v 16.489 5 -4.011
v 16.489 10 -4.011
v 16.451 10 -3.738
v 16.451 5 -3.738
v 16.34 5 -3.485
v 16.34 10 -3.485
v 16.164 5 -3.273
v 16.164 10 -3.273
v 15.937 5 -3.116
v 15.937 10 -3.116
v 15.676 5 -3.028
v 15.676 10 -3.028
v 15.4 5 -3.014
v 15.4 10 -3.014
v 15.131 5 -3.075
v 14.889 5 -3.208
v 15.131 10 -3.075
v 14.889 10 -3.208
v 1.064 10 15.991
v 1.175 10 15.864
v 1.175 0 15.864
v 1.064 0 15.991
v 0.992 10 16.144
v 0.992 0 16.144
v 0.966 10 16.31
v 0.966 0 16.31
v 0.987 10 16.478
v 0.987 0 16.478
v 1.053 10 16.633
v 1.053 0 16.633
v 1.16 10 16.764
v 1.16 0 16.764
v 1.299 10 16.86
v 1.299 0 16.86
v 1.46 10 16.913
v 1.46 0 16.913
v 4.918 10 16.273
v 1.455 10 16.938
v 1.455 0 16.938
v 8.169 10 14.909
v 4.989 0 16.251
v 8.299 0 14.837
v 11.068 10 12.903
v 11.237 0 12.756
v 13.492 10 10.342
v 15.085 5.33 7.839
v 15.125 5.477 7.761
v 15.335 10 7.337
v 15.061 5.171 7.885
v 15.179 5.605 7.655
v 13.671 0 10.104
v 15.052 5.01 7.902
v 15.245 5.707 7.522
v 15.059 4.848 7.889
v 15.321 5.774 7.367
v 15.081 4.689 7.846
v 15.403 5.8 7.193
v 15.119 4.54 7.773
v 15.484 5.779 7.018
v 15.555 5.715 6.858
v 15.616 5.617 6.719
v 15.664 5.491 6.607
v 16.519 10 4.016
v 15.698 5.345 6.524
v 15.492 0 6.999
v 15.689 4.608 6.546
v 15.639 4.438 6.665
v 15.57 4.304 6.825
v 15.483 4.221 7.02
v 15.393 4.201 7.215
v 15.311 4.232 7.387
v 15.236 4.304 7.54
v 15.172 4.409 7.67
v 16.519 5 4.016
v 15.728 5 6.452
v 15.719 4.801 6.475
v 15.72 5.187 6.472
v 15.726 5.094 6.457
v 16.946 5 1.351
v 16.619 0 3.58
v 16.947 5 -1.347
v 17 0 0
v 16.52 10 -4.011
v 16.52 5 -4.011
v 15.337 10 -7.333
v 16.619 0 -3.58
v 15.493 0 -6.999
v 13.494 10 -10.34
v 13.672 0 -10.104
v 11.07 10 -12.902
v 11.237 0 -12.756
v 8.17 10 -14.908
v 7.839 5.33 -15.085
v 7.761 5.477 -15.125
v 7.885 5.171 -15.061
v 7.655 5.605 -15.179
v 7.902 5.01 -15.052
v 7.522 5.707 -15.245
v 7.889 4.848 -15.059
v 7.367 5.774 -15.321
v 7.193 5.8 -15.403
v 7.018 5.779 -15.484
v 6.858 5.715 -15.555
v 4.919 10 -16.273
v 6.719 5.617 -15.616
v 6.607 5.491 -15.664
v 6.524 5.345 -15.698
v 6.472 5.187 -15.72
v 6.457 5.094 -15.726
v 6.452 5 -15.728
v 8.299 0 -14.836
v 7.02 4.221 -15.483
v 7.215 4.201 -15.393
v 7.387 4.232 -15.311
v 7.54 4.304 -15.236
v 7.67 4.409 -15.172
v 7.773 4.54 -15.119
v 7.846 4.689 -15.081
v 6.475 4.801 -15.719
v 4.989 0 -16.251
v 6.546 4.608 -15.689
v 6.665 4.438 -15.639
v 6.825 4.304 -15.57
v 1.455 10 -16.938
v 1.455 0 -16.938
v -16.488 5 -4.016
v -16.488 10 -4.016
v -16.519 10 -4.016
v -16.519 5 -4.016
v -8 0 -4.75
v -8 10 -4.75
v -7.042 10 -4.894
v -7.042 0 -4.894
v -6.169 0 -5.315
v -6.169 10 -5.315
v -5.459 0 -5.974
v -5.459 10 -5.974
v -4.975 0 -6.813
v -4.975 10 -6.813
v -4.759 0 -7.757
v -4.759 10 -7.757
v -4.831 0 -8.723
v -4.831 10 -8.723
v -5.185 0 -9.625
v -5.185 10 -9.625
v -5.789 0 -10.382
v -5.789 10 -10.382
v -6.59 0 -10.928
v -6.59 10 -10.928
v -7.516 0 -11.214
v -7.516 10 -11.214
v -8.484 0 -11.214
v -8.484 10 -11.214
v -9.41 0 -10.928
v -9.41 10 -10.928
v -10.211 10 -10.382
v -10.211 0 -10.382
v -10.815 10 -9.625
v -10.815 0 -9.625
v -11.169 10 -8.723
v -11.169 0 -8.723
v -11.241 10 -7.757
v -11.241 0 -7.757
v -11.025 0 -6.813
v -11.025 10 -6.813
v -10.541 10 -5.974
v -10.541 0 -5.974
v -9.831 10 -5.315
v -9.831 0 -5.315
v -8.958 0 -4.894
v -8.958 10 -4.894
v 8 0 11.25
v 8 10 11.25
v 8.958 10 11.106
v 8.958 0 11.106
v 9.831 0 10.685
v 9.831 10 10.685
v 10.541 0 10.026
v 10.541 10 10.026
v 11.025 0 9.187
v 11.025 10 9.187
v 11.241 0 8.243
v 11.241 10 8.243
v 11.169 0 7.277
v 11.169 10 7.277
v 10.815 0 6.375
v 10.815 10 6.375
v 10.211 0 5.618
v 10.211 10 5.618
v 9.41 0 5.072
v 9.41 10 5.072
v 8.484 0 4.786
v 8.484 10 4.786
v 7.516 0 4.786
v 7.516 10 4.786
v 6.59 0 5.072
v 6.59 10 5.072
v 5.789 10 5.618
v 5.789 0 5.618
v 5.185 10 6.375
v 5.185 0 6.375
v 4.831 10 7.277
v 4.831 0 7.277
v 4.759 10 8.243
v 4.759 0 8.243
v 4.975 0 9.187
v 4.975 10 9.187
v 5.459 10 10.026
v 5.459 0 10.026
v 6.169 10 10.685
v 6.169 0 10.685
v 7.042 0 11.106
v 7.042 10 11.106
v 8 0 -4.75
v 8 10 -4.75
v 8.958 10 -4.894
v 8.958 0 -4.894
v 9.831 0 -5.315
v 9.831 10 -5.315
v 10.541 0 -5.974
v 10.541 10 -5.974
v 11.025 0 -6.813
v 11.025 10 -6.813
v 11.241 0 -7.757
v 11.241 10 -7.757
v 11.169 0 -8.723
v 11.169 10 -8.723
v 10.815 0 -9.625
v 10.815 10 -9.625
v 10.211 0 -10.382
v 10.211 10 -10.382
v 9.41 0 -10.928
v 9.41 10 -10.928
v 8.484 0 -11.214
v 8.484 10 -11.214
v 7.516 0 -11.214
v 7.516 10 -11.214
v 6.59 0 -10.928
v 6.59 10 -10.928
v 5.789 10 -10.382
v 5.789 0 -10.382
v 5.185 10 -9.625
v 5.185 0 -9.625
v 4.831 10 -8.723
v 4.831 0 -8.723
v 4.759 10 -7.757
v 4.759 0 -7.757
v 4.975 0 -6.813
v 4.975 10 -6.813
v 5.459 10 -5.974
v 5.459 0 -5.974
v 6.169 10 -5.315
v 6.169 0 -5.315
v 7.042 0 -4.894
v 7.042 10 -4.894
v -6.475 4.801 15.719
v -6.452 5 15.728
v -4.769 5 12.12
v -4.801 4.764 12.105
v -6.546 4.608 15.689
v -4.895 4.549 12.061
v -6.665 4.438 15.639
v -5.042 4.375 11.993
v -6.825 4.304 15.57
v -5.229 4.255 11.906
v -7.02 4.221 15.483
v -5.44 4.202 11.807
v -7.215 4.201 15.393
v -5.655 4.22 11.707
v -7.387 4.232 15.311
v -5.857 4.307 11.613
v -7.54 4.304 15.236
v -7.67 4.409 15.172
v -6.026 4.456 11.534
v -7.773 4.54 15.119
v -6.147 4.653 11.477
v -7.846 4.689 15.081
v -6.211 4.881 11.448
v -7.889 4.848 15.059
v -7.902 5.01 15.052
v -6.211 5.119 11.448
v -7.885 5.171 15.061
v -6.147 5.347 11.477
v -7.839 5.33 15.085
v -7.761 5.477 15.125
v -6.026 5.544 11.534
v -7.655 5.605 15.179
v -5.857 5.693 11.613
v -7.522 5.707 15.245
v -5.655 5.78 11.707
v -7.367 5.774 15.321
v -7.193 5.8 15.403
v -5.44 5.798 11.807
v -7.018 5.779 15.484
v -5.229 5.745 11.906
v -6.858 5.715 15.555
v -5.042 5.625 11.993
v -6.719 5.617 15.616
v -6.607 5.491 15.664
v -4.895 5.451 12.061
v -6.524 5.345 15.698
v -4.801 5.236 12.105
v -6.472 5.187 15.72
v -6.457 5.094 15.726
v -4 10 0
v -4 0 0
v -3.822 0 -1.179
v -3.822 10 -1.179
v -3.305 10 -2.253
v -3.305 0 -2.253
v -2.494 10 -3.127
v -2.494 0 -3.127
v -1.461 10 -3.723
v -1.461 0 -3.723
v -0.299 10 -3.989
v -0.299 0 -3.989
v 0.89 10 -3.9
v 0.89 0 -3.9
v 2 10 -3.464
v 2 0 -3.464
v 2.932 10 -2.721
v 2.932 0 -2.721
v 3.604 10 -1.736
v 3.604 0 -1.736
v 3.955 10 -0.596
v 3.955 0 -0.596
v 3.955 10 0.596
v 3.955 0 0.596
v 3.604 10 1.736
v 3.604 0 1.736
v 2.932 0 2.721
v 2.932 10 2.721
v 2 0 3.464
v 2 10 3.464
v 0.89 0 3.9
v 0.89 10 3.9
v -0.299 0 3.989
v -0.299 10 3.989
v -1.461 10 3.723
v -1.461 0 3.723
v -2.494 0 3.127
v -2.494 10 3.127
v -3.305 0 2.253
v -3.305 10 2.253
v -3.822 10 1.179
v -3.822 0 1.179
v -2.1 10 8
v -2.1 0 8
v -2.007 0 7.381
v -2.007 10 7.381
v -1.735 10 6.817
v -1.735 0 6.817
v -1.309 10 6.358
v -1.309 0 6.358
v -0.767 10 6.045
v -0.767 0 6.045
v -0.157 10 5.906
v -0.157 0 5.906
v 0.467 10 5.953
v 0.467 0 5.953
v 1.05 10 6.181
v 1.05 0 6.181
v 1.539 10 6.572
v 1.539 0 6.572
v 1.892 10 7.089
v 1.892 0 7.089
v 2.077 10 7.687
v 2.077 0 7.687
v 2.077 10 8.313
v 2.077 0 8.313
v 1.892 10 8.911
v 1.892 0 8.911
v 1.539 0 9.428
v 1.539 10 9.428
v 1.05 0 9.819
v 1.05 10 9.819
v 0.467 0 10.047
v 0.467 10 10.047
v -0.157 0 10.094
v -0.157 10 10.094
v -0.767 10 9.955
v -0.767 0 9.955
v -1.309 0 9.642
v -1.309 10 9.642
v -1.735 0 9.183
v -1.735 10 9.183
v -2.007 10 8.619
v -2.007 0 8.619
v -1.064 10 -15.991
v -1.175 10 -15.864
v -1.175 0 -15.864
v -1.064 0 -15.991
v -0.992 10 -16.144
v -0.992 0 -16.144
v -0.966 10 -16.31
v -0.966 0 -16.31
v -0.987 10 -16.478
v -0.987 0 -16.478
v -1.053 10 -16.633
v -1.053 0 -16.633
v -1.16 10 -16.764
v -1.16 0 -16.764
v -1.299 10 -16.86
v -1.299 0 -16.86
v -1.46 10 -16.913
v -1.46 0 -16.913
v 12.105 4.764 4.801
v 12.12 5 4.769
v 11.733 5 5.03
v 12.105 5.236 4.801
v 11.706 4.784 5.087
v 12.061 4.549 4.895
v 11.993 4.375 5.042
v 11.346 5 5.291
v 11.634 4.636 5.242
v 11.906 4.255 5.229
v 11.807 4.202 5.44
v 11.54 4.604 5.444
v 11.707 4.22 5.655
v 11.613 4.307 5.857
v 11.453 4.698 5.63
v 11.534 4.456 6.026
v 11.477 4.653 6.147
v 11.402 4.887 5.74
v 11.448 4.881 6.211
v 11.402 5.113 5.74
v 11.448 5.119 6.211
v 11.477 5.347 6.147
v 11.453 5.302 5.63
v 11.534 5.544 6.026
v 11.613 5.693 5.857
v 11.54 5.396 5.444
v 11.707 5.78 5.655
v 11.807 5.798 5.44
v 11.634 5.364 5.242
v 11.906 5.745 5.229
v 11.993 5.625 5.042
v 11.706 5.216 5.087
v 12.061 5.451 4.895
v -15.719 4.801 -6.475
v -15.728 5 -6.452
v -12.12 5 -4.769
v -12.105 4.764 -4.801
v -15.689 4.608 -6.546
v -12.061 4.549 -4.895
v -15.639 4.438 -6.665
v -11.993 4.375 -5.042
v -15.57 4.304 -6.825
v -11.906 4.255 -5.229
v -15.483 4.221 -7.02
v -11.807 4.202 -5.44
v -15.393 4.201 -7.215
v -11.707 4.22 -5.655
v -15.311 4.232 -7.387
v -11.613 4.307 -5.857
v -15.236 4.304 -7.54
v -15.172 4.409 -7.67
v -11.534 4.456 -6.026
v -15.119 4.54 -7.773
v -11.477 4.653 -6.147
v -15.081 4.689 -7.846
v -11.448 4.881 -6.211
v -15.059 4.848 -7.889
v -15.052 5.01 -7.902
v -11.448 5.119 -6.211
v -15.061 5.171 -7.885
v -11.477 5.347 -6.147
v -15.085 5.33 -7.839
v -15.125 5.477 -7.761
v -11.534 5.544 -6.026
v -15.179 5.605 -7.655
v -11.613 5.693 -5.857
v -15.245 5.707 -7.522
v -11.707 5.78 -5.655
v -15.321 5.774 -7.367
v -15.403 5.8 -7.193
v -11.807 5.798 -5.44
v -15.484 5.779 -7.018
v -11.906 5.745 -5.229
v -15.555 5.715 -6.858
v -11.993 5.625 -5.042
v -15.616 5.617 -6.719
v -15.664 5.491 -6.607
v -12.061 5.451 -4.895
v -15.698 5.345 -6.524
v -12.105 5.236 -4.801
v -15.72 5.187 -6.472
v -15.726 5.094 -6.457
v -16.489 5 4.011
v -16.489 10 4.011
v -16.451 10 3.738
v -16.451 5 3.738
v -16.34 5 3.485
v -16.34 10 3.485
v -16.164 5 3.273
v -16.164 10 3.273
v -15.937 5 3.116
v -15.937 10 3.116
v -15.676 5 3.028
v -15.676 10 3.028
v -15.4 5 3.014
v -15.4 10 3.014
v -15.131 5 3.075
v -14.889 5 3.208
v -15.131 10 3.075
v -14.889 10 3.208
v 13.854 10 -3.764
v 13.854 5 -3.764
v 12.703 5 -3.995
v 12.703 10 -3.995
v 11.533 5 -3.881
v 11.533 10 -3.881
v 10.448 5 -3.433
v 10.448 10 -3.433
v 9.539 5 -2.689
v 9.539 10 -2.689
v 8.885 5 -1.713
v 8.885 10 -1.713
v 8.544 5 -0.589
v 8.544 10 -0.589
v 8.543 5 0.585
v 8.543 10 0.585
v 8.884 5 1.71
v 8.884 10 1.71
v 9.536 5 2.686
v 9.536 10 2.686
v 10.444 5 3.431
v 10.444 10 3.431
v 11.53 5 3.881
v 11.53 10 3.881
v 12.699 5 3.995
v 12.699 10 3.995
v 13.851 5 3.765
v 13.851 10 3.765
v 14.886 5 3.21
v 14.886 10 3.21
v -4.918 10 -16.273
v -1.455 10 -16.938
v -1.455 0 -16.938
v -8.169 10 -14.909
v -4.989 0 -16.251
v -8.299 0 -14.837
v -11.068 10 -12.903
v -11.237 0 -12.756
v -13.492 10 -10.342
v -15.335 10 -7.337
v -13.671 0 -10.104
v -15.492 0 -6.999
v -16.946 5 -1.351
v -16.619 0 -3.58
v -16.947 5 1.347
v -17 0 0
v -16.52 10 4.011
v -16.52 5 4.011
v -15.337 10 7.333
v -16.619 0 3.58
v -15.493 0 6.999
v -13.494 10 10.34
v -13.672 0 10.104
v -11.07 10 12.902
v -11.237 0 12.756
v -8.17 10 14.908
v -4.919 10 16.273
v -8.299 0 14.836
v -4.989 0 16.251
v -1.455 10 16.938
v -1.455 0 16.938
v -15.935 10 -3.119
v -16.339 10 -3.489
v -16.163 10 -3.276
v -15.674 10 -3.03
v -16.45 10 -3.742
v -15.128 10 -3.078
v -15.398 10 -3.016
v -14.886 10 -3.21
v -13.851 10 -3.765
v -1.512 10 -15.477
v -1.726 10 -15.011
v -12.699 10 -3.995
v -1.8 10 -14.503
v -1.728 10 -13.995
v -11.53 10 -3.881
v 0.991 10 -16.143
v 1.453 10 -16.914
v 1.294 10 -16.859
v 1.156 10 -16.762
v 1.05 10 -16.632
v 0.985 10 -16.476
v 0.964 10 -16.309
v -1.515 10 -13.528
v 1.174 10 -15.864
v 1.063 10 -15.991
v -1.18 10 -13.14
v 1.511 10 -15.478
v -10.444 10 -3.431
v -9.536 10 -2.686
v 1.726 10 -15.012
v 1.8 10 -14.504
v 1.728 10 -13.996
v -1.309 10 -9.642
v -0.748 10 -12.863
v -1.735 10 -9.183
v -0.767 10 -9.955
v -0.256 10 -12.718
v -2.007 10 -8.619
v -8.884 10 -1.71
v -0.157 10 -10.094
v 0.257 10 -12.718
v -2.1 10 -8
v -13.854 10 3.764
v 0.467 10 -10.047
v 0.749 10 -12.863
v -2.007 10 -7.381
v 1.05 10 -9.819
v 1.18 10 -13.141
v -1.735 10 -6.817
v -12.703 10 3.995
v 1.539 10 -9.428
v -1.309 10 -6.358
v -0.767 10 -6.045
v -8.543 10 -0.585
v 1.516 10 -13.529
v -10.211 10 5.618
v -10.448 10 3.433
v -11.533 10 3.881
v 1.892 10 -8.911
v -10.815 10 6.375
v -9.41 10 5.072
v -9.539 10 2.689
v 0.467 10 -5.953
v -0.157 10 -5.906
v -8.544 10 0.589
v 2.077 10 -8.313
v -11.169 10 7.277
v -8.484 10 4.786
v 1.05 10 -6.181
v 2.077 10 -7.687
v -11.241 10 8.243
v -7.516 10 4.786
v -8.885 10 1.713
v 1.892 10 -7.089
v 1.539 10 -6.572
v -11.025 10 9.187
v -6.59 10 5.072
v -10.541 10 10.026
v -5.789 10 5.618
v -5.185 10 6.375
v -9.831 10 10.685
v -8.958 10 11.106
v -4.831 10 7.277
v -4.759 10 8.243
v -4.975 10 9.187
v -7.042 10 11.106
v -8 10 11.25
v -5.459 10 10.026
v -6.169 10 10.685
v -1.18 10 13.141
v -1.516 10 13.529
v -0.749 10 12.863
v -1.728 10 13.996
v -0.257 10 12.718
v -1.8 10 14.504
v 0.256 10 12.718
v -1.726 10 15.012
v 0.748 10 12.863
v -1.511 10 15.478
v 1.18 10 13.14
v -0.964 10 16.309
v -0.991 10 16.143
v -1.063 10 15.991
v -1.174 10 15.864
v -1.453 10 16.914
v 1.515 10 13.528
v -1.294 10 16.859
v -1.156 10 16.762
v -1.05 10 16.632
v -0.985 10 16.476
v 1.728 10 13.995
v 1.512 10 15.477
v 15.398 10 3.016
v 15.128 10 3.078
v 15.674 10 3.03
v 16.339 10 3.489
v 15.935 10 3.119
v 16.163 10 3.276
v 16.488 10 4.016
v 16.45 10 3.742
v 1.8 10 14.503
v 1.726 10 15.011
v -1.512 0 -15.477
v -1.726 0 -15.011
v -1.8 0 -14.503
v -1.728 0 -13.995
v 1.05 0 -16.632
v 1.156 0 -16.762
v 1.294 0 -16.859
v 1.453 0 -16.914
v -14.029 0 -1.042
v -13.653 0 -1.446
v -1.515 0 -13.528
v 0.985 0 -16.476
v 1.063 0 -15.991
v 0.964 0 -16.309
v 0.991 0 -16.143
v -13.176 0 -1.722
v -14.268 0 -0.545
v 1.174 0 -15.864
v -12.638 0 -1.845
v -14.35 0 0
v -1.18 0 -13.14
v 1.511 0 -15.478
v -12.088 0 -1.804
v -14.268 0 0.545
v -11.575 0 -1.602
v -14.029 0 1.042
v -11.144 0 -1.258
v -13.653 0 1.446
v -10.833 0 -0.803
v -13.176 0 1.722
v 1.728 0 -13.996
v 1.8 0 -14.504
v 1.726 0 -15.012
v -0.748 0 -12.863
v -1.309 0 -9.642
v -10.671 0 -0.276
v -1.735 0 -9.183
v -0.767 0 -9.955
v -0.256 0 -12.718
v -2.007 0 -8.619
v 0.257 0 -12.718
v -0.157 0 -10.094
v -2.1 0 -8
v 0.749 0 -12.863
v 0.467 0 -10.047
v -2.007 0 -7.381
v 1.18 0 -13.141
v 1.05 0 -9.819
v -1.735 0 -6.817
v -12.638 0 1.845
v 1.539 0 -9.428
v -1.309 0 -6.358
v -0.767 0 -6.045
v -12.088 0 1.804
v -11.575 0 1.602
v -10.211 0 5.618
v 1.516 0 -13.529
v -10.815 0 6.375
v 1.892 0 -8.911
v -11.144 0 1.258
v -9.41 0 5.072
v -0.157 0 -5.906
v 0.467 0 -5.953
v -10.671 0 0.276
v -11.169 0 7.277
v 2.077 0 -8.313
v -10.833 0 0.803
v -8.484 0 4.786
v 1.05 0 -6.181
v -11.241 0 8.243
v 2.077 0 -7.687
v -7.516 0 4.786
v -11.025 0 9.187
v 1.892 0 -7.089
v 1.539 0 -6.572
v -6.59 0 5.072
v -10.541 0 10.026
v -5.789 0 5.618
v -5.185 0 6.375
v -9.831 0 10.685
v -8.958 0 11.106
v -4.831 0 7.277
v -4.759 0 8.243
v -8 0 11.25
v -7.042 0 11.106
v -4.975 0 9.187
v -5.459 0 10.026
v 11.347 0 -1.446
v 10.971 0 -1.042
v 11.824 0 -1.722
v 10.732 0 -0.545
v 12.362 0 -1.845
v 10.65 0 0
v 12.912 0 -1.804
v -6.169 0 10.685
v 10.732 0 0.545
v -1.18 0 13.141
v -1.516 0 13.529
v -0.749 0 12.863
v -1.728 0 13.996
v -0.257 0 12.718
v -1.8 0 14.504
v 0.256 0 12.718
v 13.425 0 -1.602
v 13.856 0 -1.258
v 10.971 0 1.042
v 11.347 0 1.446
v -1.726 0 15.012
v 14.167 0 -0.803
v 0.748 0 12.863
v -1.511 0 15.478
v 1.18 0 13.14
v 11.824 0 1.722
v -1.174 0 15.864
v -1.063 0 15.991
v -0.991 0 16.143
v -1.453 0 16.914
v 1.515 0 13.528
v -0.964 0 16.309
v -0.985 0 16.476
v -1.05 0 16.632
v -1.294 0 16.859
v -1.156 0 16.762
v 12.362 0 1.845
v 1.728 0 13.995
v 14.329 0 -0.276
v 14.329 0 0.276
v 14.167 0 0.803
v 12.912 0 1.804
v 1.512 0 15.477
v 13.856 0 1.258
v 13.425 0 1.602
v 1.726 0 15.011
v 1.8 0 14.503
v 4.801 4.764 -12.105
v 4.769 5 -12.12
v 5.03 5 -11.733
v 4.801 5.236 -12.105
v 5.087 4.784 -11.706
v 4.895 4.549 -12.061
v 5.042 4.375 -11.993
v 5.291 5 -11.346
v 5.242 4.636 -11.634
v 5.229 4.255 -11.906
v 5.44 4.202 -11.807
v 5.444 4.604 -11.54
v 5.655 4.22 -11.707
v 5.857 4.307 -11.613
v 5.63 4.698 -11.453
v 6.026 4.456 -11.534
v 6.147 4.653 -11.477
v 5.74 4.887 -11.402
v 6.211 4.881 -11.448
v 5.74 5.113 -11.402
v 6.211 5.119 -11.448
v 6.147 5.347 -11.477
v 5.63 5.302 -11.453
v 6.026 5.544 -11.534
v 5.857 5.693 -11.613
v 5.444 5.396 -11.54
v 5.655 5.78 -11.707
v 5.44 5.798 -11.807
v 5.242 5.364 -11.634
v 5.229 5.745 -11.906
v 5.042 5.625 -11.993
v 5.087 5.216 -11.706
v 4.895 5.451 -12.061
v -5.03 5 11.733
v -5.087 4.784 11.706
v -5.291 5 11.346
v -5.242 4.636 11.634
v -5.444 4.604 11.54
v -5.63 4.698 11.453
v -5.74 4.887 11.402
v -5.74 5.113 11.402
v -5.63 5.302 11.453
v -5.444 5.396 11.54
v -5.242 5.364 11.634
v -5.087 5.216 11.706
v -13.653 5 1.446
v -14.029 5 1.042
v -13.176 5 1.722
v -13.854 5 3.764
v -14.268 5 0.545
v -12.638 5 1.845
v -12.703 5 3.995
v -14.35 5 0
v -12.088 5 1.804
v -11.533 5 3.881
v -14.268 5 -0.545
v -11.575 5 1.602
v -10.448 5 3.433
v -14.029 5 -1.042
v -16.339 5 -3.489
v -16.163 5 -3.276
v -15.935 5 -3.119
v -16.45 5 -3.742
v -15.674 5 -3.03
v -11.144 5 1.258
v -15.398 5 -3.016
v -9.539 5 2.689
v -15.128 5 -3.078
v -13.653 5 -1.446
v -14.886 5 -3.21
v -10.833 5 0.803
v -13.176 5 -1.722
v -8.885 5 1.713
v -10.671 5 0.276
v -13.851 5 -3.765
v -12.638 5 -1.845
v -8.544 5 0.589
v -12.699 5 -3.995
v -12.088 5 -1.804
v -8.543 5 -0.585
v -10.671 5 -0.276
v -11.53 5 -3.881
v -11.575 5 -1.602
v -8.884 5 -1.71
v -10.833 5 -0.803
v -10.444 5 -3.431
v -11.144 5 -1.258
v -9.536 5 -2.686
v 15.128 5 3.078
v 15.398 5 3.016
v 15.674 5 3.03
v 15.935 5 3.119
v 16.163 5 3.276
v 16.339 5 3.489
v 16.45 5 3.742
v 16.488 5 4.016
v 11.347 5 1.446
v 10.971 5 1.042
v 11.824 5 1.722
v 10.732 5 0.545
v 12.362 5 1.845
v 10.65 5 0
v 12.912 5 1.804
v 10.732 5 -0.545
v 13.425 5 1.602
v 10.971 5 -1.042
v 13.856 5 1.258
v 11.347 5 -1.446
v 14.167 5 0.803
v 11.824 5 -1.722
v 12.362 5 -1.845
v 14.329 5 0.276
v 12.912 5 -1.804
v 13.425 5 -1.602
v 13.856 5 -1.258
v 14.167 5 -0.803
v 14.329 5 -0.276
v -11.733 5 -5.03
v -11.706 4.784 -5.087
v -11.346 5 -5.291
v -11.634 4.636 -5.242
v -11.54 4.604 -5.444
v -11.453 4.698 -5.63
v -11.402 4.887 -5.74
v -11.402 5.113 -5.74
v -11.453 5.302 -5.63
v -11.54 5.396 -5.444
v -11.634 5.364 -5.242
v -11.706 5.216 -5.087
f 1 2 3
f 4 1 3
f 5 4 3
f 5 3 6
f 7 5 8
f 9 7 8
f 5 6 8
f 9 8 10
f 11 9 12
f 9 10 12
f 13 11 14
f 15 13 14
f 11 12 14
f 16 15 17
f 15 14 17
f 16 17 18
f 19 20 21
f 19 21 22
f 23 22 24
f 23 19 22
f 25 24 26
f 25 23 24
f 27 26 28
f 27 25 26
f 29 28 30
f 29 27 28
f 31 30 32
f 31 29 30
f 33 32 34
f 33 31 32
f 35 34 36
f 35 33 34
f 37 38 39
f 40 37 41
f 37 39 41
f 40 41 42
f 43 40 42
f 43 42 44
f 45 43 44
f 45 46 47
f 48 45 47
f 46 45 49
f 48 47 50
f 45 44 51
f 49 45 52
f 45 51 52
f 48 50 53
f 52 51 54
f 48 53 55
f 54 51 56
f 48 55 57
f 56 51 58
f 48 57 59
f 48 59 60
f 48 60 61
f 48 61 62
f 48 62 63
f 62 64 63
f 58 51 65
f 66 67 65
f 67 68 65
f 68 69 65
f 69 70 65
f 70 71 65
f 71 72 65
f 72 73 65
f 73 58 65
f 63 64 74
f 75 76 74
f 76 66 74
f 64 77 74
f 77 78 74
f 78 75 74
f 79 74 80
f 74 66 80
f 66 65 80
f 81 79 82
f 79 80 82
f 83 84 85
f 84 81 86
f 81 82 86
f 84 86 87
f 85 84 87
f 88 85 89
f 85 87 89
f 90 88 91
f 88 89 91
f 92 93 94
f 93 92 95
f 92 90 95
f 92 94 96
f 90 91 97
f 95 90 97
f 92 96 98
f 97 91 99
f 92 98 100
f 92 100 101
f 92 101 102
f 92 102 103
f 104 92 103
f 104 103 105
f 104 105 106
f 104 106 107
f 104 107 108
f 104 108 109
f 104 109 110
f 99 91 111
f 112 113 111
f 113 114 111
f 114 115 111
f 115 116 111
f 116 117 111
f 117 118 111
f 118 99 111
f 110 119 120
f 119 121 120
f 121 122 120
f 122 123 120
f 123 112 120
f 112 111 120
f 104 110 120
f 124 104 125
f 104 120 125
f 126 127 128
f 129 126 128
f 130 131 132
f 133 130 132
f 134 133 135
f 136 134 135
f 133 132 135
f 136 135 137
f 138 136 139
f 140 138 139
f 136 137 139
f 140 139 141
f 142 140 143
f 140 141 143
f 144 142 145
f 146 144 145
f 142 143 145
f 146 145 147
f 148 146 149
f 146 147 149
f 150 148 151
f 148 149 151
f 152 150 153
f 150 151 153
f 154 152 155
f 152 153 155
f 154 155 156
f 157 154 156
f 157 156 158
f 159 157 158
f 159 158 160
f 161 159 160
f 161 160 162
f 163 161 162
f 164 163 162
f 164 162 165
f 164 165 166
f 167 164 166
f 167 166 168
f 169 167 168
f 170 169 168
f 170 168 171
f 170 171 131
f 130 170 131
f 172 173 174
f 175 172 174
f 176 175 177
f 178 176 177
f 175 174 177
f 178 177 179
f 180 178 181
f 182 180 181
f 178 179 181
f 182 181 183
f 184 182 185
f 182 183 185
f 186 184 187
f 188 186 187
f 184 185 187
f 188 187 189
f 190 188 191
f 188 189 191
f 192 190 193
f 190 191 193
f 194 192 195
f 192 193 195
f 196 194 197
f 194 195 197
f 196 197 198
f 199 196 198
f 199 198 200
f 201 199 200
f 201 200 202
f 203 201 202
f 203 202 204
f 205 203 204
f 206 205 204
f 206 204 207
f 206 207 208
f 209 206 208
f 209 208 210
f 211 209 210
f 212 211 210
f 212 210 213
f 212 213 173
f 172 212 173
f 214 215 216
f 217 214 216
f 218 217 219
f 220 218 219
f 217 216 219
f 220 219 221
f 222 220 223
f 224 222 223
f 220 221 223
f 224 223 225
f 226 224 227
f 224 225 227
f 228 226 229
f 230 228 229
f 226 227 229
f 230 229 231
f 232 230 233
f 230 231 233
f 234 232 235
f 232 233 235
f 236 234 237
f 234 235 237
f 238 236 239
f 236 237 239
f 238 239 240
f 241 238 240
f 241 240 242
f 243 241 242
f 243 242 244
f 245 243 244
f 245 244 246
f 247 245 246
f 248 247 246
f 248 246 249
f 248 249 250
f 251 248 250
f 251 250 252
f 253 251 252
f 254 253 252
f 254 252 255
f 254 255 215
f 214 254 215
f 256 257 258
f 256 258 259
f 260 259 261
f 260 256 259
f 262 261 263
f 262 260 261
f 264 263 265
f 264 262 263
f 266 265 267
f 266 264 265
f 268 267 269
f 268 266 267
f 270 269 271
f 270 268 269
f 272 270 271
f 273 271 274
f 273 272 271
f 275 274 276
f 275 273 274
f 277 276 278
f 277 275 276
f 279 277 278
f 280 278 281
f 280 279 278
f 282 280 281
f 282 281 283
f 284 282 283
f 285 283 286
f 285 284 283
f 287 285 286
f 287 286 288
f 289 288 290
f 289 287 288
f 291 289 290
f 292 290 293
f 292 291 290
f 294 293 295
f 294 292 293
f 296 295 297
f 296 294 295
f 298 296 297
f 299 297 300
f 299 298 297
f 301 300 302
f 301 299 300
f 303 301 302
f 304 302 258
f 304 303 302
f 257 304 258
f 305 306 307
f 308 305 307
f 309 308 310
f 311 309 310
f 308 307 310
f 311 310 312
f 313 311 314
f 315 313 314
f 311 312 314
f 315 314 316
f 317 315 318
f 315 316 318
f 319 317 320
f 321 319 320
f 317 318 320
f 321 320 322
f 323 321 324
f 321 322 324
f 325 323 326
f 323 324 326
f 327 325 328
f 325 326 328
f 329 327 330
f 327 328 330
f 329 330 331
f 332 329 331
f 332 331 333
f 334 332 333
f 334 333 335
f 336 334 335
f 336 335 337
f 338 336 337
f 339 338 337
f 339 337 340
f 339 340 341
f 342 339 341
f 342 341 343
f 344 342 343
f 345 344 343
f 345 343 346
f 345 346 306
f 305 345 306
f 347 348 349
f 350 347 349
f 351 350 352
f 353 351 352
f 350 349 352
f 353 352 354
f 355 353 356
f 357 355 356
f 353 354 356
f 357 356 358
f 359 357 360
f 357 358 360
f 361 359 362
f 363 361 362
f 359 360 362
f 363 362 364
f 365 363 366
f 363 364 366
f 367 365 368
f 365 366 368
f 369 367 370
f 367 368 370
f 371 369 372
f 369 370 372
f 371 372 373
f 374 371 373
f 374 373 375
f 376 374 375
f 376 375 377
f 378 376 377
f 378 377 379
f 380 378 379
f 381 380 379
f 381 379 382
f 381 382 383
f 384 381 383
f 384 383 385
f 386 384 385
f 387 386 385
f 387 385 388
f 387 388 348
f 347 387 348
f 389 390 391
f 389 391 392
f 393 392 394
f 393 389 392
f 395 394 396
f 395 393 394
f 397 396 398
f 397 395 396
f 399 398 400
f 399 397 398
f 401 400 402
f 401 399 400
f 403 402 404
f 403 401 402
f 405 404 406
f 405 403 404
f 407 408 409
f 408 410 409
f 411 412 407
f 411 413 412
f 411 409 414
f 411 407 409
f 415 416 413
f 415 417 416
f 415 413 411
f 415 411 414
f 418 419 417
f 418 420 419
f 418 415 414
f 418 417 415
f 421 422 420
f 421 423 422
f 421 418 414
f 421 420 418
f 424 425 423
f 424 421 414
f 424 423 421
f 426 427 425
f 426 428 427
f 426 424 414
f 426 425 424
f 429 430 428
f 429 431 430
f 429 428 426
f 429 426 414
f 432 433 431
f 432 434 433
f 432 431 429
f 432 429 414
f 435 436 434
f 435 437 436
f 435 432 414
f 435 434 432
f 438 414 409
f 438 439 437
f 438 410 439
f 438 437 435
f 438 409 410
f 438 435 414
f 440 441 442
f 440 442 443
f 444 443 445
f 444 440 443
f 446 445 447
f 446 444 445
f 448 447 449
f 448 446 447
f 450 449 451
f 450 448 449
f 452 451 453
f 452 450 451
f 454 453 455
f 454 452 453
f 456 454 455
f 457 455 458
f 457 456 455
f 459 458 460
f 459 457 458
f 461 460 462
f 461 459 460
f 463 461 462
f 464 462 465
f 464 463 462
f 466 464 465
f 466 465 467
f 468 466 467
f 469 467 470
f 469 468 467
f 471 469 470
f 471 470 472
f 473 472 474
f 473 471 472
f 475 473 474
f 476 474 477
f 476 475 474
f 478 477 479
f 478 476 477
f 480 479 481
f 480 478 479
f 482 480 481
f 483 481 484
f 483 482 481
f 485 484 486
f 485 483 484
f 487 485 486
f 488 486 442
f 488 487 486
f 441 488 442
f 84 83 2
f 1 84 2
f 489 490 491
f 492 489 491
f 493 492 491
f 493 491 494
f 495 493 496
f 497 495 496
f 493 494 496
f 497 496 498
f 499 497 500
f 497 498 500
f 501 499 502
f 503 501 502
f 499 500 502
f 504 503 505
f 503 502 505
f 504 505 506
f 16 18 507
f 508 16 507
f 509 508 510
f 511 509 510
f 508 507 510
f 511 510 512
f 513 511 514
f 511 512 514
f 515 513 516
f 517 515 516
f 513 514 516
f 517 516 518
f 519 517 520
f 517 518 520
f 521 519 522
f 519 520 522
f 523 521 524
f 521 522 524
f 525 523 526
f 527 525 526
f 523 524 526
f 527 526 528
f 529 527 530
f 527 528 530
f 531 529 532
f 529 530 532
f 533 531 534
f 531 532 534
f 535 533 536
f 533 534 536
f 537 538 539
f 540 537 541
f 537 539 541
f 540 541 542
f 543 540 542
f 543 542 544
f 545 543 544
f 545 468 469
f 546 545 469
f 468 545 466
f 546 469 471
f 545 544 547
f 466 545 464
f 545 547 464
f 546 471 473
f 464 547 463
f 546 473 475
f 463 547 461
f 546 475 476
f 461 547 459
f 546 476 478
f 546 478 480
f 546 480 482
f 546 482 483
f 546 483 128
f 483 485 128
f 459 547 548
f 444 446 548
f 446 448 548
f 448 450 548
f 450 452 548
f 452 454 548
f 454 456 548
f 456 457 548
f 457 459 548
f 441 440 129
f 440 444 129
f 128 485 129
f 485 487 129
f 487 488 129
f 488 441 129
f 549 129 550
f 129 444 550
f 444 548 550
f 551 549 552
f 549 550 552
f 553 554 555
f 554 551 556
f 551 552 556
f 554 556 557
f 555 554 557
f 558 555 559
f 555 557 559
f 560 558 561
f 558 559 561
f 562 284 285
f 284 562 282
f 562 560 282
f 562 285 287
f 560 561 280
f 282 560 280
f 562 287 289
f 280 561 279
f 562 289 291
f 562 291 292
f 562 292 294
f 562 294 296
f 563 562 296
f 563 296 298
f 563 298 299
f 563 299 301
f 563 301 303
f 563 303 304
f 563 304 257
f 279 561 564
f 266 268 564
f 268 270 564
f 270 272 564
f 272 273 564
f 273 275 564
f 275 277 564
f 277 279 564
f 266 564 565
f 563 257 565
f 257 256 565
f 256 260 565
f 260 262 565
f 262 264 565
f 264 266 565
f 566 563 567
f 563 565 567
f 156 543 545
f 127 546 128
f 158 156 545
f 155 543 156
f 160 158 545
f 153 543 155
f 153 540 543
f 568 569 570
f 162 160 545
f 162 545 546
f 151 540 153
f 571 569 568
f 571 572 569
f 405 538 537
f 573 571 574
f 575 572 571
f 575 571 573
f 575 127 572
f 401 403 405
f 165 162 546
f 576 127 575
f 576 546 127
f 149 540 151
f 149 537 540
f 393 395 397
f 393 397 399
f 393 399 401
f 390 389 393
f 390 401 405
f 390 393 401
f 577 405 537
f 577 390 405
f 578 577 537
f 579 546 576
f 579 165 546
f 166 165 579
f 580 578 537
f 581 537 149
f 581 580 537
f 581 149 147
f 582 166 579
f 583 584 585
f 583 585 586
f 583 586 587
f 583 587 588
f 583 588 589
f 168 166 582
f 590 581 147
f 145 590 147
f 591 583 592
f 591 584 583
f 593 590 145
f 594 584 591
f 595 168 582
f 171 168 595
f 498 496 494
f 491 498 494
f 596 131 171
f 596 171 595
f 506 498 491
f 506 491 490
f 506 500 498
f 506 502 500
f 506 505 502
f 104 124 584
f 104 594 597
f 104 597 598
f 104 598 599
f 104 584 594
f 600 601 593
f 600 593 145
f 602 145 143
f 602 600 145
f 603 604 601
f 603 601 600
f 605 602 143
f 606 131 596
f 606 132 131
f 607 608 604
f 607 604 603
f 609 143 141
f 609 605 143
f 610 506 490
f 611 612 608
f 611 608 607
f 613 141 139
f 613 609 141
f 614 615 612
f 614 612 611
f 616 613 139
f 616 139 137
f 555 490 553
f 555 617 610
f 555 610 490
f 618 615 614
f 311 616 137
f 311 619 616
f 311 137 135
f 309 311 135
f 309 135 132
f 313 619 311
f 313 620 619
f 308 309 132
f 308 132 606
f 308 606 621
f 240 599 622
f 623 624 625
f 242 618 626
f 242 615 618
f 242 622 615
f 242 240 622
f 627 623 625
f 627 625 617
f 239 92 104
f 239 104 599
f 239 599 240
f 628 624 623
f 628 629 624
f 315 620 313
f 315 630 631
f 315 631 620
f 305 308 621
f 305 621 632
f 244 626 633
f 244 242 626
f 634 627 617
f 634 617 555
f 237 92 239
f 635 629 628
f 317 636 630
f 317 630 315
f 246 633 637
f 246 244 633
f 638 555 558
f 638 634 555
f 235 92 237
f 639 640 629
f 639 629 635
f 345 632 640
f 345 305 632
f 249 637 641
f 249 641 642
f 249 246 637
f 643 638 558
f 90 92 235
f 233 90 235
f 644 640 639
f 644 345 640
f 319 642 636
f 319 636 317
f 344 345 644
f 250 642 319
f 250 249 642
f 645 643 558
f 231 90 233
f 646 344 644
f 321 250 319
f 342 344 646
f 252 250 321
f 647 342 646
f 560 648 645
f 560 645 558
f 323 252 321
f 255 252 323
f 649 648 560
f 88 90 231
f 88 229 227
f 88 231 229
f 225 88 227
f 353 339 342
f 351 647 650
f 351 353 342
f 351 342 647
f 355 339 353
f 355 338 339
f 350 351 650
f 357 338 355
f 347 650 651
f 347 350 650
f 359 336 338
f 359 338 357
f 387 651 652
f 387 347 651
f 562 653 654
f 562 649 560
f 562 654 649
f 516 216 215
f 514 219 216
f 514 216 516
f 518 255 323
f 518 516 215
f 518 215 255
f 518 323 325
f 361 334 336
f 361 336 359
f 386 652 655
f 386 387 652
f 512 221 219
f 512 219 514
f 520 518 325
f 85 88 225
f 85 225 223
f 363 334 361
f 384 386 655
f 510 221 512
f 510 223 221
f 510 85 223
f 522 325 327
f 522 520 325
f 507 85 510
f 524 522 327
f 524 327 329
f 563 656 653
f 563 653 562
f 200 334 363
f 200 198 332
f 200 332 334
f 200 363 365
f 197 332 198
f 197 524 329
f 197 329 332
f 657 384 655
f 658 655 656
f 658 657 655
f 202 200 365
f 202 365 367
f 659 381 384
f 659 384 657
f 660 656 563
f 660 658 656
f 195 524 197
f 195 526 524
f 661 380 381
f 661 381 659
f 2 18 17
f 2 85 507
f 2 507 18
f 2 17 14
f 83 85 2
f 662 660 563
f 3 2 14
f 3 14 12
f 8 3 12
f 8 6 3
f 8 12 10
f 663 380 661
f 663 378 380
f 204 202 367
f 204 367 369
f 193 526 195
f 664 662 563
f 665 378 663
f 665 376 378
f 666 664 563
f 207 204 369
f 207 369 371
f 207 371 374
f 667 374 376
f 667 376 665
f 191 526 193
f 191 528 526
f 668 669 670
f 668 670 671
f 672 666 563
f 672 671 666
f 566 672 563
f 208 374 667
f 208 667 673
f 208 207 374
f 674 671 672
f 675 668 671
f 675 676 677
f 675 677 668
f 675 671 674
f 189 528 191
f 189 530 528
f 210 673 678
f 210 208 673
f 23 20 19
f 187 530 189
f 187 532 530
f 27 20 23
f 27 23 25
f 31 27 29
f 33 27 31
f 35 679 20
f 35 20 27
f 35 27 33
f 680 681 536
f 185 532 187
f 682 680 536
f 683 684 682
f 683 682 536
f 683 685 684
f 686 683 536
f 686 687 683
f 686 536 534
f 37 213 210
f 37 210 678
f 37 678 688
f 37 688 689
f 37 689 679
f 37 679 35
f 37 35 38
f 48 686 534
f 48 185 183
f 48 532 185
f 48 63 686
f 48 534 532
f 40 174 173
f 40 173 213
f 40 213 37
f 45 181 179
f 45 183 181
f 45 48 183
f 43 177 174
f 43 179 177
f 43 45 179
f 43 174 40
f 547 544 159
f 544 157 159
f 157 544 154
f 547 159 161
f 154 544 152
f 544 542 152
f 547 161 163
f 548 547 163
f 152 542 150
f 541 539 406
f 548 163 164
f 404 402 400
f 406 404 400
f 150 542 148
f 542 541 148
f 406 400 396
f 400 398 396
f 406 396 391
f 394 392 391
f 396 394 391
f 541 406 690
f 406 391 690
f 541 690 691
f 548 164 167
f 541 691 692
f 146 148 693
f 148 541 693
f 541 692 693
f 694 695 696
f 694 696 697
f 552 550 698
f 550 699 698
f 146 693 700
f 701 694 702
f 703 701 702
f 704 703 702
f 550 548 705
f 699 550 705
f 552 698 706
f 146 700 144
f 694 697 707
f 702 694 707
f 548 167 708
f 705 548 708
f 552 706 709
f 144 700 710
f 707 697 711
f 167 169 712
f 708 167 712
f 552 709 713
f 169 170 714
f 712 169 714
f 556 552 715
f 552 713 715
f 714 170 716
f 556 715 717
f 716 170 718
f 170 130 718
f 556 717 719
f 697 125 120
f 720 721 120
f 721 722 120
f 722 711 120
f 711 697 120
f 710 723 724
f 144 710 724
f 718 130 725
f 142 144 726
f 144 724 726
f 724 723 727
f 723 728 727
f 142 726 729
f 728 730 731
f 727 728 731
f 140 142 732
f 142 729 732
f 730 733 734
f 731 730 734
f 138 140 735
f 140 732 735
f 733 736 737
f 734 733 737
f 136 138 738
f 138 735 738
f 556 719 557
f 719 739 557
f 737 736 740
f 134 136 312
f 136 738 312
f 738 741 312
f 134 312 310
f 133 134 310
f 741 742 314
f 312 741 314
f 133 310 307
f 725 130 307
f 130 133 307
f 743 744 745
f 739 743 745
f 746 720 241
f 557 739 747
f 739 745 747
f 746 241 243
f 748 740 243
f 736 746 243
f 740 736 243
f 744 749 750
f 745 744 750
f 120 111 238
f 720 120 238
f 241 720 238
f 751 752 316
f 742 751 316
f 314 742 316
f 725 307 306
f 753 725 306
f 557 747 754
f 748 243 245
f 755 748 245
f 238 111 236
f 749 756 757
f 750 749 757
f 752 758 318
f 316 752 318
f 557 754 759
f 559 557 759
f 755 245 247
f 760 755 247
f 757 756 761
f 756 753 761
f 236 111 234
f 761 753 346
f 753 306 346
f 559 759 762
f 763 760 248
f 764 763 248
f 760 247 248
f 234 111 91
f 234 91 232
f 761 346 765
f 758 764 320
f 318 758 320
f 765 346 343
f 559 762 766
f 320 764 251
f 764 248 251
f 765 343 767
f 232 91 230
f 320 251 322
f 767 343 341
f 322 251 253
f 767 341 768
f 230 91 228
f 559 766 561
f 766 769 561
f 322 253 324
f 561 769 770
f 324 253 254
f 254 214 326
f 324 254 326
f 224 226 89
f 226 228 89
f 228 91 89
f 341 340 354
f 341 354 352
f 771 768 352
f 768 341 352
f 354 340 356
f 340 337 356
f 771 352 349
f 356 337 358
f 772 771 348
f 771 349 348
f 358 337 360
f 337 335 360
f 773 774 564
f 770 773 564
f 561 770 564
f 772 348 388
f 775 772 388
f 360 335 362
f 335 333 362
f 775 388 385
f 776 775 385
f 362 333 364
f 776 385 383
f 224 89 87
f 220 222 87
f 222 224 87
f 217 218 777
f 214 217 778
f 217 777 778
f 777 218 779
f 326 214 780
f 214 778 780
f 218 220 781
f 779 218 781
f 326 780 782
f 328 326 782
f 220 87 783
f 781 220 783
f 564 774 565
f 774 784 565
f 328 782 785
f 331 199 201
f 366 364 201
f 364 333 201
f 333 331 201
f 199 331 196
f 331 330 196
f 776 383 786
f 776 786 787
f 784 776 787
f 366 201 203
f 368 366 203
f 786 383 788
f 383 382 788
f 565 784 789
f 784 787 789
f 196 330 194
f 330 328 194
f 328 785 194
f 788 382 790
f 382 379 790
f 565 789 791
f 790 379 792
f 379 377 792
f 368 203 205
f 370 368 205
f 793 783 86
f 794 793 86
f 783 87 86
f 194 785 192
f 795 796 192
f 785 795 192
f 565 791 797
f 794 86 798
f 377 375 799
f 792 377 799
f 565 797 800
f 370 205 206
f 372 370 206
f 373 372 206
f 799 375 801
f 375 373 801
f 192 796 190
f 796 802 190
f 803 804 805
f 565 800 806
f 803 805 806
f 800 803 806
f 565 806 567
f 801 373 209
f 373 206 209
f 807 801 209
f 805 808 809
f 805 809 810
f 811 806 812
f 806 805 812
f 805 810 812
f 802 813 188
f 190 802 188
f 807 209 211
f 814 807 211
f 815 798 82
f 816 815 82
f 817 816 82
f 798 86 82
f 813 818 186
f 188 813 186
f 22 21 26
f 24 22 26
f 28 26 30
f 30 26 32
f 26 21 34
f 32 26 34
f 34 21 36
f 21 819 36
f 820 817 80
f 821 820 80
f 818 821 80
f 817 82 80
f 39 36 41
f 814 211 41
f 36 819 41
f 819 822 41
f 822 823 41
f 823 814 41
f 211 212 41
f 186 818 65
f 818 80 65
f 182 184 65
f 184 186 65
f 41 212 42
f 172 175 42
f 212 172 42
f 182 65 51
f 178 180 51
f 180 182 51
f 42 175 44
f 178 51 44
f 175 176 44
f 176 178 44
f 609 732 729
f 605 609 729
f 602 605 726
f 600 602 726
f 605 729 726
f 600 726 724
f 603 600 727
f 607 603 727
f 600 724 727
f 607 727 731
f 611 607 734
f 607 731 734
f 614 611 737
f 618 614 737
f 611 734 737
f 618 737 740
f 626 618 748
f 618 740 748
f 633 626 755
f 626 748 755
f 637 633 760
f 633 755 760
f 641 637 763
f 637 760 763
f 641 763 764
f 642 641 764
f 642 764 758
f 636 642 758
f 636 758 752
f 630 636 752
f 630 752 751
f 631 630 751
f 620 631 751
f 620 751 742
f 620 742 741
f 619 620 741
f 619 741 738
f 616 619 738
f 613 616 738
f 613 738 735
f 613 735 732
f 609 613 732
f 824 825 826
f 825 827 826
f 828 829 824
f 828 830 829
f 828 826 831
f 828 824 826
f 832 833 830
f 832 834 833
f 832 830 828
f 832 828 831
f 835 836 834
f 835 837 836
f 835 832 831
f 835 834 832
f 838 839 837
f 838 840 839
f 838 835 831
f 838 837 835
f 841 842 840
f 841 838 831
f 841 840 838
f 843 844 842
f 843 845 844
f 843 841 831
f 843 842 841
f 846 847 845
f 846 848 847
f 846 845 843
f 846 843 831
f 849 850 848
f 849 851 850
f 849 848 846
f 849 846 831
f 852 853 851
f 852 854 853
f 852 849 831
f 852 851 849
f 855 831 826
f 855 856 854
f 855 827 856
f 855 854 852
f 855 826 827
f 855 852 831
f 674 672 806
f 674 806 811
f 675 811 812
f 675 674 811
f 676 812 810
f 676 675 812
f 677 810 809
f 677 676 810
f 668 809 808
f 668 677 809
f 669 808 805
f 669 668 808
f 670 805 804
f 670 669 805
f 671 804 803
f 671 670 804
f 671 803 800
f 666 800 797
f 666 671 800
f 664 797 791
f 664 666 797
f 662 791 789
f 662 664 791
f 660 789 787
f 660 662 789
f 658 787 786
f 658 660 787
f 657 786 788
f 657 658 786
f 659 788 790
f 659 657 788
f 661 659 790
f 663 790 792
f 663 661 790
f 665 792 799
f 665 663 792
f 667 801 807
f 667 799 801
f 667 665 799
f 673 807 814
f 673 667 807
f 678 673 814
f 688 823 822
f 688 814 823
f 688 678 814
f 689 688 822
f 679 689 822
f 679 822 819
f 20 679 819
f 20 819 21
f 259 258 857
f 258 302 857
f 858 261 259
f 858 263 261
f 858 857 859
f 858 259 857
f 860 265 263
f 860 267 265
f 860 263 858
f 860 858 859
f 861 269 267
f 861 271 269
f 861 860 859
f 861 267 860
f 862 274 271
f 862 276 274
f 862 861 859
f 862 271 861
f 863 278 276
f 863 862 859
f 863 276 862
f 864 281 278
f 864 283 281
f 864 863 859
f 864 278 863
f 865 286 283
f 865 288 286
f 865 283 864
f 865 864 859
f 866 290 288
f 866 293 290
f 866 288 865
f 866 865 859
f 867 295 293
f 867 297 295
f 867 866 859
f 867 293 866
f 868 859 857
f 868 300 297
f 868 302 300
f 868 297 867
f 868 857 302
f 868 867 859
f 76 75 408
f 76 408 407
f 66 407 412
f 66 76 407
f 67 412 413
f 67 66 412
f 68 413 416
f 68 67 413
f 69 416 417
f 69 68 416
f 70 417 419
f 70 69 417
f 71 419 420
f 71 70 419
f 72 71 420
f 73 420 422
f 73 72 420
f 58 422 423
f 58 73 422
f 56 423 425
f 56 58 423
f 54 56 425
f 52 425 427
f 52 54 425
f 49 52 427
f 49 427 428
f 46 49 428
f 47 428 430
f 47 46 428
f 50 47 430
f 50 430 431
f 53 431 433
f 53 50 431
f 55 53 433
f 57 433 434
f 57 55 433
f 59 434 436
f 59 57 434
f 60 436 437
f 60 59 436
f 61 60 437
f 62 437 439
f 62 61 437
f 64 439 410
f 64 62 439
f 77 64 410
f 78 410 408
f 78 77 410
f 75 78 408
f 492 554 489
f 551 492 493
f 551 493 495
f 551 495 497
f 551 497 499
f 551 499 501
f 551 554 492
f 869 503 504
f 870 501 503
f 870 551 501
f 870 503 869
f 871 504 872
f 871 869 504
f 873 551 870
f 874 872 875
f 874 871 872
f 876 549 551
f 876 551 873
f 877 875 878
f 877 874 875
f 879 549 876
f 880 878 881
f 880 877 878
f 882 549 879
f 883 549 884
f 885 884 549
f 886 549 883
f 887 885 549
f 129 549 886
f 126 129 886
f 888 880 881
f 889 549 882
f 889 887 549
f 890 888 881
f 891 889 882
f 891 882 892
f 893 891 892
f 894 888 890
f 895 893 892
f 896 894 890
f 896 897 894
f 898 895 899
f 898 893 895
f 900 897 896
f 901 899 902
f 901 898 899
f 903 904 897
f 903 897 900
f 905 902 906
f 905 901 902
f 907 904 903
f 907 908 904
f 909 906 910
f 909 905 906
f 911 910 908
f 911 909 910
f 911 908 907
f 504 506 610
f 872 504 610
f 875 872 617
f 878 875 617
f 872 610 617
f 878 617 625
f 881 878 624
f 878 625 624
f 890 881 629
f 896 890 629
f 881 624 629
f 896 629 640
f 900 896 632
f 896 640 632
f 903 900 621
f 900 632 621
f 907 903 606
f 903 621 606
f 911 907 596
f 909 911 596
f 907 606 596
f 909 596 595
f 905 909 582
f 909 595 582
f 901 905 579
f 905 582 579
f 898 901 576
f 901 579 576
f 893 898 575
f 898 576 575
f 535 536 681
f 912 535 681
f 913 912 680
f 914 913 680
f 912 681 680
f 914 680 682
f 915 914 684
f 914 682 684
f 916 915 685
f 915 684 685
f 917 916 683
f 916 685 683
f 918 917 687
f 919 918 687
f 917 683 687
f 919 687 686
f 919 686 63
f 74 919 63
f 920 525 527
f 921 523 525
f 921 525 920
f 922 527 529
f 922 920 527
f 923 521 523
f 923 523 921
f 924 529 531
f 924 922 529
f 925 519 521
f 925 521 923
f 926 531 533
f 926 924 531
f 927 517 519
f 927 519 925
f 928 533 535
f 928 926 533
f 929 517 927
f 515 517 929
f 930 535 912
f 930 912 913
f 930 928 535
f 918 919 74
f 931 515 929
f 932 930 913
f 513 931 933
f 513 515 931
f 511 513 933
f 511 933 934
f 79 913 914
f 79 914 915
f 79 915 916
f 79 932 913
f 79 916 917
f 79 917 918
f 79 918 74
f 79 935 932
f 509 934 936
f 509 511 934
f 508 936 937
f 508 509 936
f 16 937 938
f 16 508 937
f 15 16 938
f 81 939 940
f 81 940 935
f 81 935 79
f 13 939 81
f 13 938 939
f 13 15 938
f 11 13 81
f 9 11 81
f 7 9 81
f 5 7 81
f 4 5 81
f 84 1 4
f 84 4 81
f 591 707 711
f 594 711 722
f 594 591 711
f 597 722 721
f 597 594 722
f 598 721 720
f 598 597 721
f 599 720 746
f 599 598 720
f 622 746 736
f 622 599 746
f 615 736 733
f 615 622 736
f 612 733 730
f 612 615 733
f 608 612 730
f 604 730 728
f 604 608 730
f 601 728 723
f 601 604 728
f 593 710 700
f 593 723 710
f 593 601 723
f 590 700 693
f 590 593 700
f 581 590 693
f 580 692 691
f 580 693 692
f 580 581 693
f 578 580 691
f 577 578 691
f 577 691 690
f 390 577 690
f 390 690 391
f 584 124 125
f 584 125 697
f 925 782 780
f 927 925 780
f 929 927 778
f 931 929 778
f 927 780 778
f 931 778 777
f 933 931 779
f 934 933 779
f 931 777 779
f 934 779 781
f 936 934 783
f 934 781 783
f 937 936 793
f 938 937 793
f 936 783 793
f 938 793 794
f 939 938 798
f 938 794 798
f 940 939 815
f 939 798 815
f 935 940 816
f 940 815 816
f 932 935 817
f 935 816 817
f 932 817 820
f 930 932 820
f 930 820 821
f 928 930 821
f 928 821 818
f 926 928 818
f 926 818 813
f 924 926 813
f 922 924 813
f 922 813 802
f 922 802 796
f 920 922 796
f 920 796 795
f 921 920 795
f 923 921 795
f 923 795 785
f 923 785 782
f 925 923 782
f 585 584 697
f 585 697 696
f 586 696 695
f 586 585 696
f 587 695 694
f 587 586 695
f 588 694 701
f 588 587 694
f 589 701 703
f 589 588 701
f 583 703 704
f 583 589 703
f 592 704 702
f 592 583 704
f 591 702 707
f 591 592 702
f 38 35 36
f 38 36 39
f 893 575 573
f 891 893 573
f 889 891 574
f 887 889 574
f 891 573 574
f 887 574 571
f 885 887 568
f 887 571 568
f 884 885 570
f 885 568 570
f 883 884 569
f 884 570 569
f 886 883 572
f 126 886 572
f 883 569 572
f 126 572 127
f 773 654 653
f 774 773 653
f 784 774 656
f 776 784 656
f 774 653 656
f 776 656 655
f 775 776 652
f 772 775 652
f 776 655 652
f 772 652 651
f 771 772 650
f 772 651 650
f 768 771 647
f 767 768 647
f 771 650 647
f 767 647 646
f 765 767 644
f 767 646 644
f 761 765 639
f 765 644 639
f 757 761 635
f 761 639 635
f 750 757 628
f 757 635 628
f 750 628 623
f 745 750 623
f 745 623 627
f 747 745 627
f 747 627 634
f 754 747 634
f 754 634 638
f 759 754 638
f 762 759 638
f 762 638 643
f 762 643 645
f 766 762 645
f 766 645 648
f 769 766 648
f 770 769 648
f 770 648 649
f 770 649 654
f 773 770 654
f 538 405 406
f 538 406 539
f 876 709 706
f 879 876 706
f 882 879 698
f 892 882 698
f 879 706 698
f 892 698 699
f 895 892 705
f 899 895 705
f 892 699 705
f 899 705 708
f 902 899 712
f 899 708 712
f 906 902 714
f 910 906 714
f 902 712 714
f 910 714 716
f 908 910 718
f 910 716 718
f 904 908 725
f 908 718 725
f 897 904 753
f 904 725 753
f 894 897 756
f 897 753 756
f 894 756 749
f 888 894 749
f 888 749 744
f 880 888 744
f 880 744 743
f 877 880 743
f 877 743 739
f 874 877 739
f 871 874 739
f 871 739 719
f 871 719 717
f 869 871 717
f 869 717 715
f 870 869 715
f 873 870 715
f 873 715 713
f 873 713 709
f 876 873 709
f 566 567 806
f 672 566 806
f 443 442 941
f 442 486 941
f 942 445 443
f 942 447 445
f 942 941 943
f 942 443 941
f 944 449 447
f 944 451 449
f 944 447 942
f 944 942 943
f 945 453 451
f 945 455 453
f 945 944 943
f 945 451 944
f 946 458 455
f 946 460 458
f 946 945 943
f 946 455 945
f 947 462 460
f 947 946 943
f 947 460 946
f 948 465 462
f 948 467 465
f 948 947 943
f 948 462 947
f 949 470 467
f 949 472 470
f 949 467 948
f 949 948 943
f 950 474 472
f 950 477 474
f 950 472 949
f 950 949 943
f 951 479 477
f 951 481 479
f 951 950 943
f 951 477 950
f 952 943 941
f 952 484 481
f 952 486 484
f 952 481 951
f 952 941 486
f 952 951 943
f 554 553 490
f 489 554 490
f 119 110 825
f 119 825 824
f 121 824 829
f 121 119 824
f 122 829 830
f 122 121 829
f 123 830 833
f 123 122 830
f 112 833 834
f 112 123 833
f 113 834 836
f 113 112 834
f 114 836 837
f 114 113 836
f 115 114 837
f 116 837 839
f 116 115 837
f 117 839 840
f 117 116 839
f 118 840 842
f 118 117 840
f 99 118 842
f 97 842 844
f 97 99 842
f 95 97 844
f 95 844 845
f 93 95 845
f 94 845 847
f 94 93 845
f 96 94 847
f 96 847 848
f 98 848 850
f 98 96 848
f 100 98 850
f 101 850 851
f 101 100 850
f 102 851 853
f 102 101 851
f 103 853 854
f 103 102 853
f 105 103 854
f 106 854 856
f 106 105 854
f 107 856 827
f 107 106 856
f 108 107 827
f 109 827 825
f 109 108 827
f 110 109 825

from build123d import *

# Parameters (mm, degrees)
SKETCH1_R                  = 17
BOSS_EXTRUDE1_DEPTH        = 10
F_3_7_3_7_DIAMETER_HOLE1_D = 3.7
M5_TAPPED_HOLE1_D          = 4.2
F_12_0_12_DIAMETER_HOLE1_D = 8
CUT_EXTRUDE3_DEPTH         = 5
CIRPATTERN1_COUNT          = 4
SKETCH21_R                 = 3.25
CUT_EXTRUDE4_DEPTH         = 27.038433302
CUT_EXTRUDE5_DEPTH         = 27.038433302


with BuildPart() as part:
    # Sketch1 → Boss-Extrude1 (new body)
    with BuildSketch(Plane(origin=(0, 0, 0), x_dir=(1, 0, 0), z_dir=(0, 1, 0))):
        with Locations(Location((0, 0, 0), (0, 0, 270))):
            Circle(SKETCH1_R)
    extrude(amount=BOSS_EXTRUDE1_DEPTH)

    # Ø3.7 (3.7) Diameter Hole1 (through all)
    with Locations(Plane(origin=(0, 10, 0), x_dir=(1, 0, 0), z_dir=(0, 1, 0))):
        with Locations((-12.5, 0), (12.5, 0)):
            Hole(F_3_7_3_7_DIAMETER_HOLE1_D / 2)

    # M5 Tapped Hole1 (through all)
    with Locations(Plane(origin=(0, 10, 0), x_dir=(1, 0, 0), z_dir=(0, 1, 0))):
        with Locations((0, 8), (0, -8)):
            Hole(M5_TAPPED_HOLE1_D / 2)

    # Ø12.0 (12) Diameter Hole1 (through all)
    with Locations(Plane(origin=(0, 10, 0), x_dir=(1, 0, 0), z_dir=(0, 1, 0))):
        with Locations((0, 0)):
            Hole(F_12_0_12_DIAMETER_HOLE1_D / 2)

    # Sketch16 → Cut-Extrude3 (cut)
    with BuildSketch(Plane(origin=(0, 10, 0), x_dir=(1, 0, 0), z_dir=(0, 1, 0))):
        with BuildLine():
            Line((-16.487793391, 4.015586089), (-18.960782116, 4.015586089))
            Line((-18.960782116, 4.015586089), (-18.960782116, -4.01131039))
            Line((-18.960782116, -4.01131039), (-16.488958096, -4.01131039))
            ThreePointArc((-16.488958096, -4.01131039), (-15.936832629, -3.116268297), (-14.889208553, -3.208065225))
            ThreePointArc((-14.889208553, -3.208065225), (-8.500000472, -0.001943416), (-14.886090124, 3.210385323))
            ThreePointArc((-14.886090124, 3.210385323), (-15.935159239, 3.119232137), (-16.487793391, 4.015586089))
        make_face()
        with BuildLine():
            Line((16.487793391, -4.015586089), (18.960782116, -4.015586089))
            Line((18.960782116, -4.015586089), (18.960782116, 4.01131039))
            Line((18.960782116, 4.01131039), (16.488958096, 4.01131039))
            ThreePointArc((16.488958096, 4.01131039), (15.936832629, 3.116268297), (14.889208553, 3.208065225))
            ThreePointArc((14.889208553, 3.208065225), (8.500000472, 0.001943416), (14.886090124, -3.210385323))
            ThreePointArc((14.886090124, -3.210385323), (15.935159239, -3.119232137), (16.487793391, -4.015586089))
        make_face()
    extrude(amount=-CUT_EXTRUDE3_DEPTH, mode=Mode.SUBTRACT)

    # Sketch18 → M2 Tapped Hole1 (revolve, cut)
    with BuildSketch(Plane(origin=(15.40723238, 5, 7.18451045), x_dir=(0.42261826174070016, 0, -0.9063077870366497), z_dir=(0, 1, 0))):
        Polygon((0, 0), (0, 4.480688495), (0.8, 4), (0.8, 0), align=None)
    m2_tapped_hole1 = revolve(axis=Axis((21.162286827, 5, 9.868136412), (-0.9063077870366497, 0, -0.42261826174070016)), mode=Mode.SUBTRACT)

    # CirPattern1: M2 Tapped Hole1 ×4 about axis
    cirpattern1_axis = Axis((0, 0, 0), (0, 1, 0))
    for i in range(1, CIRPATTERN1_COUNT):
        add(m2_tapped_hole1.rotate(cirpattern1_axis, i * 360 / CIRPATTERN1_COUNT), mode=Mode.SUBTRACT)

    # Sketch21 → Cut-Extrude4 (cut, through all)
    with BuildSketch(Plane(origin=(0, 10, 0), x_dir=(1, 0, 0), z_dir=(0, 1, 0))):
        with Locations(Location((-8, 8, 0), (0, 0, 270))):
            Circle(SKETCH21_R)
        with Locations(Location((8, 8, 0), (0, 0, 270))):
            Circle(SKETCH21_R)
        with Locations(Location((8, -8, 0), (0, 0, 270))):
            Circle(SKETCH21_R)
        with Locations(Location((-8, -8, 0), (0, 0, 270))):
            Circle(SKETCH21_R)
    extrude(amount=-CUT_EXTRUDE4_DEPTH, mode=Mode.SUBTRACT)

    # Sketch14 → Cut-Extrude5 (cut, through all)
    with BuildSketch(Plane(origin=(0, 10, 0), x_dir=(1, 0, 0), z_dir=(0, 1, 0))):
        with BuildLine():
            Line((-1.459621356, 16.913091325), (-1.166781334, 18.506531105))
            Line((-1.166781334, 18.506531105), (1.608035184, 18.356142043))
            Line((1.608035184, 18.356142043), (1.452856339, 16.913870267))
            ThreePointArc((1.452856339, 16.913870267), (0.984569232, 16.476462251), (1.174122642, 15.864344539))
            ThreePointArc((1.174122642, 15.864344539), (0.000614681, 12.700000105), (-1.175054186, 15.86354232))
            ThreePointArc((-1.175054186, 15.86354232), (-0.986764651, 16.477946041), (-1.459621356, 16.913091325))
        make_face()
        with BuildLine():
            Line((1.459621356, -16.913091325), (1.166781334, -18.506531105))
            Line((1.166781334, -18.506531105), (-1.608035184, -18.356142043))
            Line((-1.608035184, -18.356142043), (-1.452856339, -16.913870267))
            ThreePointArc((-1.452856339, -16.913870267), (-0.984569232, -16.476462251), (-1.174122642, -15.864344539))
            ThreePointArc((-1.174122642, -15.864344539), (-0.000614681, -12.700000105), (1.175054186, -15.86354232))
            ThreePointArc((1.175054186, -15.86354232), (0.986764651, -16.477946041), (1.459621356, -16.913091325))
        make_face()
    extrude(amount=-CUT_EXTRUDE5_DEPTH, mode=Mode.SUBTRACT)


solid = part.part
